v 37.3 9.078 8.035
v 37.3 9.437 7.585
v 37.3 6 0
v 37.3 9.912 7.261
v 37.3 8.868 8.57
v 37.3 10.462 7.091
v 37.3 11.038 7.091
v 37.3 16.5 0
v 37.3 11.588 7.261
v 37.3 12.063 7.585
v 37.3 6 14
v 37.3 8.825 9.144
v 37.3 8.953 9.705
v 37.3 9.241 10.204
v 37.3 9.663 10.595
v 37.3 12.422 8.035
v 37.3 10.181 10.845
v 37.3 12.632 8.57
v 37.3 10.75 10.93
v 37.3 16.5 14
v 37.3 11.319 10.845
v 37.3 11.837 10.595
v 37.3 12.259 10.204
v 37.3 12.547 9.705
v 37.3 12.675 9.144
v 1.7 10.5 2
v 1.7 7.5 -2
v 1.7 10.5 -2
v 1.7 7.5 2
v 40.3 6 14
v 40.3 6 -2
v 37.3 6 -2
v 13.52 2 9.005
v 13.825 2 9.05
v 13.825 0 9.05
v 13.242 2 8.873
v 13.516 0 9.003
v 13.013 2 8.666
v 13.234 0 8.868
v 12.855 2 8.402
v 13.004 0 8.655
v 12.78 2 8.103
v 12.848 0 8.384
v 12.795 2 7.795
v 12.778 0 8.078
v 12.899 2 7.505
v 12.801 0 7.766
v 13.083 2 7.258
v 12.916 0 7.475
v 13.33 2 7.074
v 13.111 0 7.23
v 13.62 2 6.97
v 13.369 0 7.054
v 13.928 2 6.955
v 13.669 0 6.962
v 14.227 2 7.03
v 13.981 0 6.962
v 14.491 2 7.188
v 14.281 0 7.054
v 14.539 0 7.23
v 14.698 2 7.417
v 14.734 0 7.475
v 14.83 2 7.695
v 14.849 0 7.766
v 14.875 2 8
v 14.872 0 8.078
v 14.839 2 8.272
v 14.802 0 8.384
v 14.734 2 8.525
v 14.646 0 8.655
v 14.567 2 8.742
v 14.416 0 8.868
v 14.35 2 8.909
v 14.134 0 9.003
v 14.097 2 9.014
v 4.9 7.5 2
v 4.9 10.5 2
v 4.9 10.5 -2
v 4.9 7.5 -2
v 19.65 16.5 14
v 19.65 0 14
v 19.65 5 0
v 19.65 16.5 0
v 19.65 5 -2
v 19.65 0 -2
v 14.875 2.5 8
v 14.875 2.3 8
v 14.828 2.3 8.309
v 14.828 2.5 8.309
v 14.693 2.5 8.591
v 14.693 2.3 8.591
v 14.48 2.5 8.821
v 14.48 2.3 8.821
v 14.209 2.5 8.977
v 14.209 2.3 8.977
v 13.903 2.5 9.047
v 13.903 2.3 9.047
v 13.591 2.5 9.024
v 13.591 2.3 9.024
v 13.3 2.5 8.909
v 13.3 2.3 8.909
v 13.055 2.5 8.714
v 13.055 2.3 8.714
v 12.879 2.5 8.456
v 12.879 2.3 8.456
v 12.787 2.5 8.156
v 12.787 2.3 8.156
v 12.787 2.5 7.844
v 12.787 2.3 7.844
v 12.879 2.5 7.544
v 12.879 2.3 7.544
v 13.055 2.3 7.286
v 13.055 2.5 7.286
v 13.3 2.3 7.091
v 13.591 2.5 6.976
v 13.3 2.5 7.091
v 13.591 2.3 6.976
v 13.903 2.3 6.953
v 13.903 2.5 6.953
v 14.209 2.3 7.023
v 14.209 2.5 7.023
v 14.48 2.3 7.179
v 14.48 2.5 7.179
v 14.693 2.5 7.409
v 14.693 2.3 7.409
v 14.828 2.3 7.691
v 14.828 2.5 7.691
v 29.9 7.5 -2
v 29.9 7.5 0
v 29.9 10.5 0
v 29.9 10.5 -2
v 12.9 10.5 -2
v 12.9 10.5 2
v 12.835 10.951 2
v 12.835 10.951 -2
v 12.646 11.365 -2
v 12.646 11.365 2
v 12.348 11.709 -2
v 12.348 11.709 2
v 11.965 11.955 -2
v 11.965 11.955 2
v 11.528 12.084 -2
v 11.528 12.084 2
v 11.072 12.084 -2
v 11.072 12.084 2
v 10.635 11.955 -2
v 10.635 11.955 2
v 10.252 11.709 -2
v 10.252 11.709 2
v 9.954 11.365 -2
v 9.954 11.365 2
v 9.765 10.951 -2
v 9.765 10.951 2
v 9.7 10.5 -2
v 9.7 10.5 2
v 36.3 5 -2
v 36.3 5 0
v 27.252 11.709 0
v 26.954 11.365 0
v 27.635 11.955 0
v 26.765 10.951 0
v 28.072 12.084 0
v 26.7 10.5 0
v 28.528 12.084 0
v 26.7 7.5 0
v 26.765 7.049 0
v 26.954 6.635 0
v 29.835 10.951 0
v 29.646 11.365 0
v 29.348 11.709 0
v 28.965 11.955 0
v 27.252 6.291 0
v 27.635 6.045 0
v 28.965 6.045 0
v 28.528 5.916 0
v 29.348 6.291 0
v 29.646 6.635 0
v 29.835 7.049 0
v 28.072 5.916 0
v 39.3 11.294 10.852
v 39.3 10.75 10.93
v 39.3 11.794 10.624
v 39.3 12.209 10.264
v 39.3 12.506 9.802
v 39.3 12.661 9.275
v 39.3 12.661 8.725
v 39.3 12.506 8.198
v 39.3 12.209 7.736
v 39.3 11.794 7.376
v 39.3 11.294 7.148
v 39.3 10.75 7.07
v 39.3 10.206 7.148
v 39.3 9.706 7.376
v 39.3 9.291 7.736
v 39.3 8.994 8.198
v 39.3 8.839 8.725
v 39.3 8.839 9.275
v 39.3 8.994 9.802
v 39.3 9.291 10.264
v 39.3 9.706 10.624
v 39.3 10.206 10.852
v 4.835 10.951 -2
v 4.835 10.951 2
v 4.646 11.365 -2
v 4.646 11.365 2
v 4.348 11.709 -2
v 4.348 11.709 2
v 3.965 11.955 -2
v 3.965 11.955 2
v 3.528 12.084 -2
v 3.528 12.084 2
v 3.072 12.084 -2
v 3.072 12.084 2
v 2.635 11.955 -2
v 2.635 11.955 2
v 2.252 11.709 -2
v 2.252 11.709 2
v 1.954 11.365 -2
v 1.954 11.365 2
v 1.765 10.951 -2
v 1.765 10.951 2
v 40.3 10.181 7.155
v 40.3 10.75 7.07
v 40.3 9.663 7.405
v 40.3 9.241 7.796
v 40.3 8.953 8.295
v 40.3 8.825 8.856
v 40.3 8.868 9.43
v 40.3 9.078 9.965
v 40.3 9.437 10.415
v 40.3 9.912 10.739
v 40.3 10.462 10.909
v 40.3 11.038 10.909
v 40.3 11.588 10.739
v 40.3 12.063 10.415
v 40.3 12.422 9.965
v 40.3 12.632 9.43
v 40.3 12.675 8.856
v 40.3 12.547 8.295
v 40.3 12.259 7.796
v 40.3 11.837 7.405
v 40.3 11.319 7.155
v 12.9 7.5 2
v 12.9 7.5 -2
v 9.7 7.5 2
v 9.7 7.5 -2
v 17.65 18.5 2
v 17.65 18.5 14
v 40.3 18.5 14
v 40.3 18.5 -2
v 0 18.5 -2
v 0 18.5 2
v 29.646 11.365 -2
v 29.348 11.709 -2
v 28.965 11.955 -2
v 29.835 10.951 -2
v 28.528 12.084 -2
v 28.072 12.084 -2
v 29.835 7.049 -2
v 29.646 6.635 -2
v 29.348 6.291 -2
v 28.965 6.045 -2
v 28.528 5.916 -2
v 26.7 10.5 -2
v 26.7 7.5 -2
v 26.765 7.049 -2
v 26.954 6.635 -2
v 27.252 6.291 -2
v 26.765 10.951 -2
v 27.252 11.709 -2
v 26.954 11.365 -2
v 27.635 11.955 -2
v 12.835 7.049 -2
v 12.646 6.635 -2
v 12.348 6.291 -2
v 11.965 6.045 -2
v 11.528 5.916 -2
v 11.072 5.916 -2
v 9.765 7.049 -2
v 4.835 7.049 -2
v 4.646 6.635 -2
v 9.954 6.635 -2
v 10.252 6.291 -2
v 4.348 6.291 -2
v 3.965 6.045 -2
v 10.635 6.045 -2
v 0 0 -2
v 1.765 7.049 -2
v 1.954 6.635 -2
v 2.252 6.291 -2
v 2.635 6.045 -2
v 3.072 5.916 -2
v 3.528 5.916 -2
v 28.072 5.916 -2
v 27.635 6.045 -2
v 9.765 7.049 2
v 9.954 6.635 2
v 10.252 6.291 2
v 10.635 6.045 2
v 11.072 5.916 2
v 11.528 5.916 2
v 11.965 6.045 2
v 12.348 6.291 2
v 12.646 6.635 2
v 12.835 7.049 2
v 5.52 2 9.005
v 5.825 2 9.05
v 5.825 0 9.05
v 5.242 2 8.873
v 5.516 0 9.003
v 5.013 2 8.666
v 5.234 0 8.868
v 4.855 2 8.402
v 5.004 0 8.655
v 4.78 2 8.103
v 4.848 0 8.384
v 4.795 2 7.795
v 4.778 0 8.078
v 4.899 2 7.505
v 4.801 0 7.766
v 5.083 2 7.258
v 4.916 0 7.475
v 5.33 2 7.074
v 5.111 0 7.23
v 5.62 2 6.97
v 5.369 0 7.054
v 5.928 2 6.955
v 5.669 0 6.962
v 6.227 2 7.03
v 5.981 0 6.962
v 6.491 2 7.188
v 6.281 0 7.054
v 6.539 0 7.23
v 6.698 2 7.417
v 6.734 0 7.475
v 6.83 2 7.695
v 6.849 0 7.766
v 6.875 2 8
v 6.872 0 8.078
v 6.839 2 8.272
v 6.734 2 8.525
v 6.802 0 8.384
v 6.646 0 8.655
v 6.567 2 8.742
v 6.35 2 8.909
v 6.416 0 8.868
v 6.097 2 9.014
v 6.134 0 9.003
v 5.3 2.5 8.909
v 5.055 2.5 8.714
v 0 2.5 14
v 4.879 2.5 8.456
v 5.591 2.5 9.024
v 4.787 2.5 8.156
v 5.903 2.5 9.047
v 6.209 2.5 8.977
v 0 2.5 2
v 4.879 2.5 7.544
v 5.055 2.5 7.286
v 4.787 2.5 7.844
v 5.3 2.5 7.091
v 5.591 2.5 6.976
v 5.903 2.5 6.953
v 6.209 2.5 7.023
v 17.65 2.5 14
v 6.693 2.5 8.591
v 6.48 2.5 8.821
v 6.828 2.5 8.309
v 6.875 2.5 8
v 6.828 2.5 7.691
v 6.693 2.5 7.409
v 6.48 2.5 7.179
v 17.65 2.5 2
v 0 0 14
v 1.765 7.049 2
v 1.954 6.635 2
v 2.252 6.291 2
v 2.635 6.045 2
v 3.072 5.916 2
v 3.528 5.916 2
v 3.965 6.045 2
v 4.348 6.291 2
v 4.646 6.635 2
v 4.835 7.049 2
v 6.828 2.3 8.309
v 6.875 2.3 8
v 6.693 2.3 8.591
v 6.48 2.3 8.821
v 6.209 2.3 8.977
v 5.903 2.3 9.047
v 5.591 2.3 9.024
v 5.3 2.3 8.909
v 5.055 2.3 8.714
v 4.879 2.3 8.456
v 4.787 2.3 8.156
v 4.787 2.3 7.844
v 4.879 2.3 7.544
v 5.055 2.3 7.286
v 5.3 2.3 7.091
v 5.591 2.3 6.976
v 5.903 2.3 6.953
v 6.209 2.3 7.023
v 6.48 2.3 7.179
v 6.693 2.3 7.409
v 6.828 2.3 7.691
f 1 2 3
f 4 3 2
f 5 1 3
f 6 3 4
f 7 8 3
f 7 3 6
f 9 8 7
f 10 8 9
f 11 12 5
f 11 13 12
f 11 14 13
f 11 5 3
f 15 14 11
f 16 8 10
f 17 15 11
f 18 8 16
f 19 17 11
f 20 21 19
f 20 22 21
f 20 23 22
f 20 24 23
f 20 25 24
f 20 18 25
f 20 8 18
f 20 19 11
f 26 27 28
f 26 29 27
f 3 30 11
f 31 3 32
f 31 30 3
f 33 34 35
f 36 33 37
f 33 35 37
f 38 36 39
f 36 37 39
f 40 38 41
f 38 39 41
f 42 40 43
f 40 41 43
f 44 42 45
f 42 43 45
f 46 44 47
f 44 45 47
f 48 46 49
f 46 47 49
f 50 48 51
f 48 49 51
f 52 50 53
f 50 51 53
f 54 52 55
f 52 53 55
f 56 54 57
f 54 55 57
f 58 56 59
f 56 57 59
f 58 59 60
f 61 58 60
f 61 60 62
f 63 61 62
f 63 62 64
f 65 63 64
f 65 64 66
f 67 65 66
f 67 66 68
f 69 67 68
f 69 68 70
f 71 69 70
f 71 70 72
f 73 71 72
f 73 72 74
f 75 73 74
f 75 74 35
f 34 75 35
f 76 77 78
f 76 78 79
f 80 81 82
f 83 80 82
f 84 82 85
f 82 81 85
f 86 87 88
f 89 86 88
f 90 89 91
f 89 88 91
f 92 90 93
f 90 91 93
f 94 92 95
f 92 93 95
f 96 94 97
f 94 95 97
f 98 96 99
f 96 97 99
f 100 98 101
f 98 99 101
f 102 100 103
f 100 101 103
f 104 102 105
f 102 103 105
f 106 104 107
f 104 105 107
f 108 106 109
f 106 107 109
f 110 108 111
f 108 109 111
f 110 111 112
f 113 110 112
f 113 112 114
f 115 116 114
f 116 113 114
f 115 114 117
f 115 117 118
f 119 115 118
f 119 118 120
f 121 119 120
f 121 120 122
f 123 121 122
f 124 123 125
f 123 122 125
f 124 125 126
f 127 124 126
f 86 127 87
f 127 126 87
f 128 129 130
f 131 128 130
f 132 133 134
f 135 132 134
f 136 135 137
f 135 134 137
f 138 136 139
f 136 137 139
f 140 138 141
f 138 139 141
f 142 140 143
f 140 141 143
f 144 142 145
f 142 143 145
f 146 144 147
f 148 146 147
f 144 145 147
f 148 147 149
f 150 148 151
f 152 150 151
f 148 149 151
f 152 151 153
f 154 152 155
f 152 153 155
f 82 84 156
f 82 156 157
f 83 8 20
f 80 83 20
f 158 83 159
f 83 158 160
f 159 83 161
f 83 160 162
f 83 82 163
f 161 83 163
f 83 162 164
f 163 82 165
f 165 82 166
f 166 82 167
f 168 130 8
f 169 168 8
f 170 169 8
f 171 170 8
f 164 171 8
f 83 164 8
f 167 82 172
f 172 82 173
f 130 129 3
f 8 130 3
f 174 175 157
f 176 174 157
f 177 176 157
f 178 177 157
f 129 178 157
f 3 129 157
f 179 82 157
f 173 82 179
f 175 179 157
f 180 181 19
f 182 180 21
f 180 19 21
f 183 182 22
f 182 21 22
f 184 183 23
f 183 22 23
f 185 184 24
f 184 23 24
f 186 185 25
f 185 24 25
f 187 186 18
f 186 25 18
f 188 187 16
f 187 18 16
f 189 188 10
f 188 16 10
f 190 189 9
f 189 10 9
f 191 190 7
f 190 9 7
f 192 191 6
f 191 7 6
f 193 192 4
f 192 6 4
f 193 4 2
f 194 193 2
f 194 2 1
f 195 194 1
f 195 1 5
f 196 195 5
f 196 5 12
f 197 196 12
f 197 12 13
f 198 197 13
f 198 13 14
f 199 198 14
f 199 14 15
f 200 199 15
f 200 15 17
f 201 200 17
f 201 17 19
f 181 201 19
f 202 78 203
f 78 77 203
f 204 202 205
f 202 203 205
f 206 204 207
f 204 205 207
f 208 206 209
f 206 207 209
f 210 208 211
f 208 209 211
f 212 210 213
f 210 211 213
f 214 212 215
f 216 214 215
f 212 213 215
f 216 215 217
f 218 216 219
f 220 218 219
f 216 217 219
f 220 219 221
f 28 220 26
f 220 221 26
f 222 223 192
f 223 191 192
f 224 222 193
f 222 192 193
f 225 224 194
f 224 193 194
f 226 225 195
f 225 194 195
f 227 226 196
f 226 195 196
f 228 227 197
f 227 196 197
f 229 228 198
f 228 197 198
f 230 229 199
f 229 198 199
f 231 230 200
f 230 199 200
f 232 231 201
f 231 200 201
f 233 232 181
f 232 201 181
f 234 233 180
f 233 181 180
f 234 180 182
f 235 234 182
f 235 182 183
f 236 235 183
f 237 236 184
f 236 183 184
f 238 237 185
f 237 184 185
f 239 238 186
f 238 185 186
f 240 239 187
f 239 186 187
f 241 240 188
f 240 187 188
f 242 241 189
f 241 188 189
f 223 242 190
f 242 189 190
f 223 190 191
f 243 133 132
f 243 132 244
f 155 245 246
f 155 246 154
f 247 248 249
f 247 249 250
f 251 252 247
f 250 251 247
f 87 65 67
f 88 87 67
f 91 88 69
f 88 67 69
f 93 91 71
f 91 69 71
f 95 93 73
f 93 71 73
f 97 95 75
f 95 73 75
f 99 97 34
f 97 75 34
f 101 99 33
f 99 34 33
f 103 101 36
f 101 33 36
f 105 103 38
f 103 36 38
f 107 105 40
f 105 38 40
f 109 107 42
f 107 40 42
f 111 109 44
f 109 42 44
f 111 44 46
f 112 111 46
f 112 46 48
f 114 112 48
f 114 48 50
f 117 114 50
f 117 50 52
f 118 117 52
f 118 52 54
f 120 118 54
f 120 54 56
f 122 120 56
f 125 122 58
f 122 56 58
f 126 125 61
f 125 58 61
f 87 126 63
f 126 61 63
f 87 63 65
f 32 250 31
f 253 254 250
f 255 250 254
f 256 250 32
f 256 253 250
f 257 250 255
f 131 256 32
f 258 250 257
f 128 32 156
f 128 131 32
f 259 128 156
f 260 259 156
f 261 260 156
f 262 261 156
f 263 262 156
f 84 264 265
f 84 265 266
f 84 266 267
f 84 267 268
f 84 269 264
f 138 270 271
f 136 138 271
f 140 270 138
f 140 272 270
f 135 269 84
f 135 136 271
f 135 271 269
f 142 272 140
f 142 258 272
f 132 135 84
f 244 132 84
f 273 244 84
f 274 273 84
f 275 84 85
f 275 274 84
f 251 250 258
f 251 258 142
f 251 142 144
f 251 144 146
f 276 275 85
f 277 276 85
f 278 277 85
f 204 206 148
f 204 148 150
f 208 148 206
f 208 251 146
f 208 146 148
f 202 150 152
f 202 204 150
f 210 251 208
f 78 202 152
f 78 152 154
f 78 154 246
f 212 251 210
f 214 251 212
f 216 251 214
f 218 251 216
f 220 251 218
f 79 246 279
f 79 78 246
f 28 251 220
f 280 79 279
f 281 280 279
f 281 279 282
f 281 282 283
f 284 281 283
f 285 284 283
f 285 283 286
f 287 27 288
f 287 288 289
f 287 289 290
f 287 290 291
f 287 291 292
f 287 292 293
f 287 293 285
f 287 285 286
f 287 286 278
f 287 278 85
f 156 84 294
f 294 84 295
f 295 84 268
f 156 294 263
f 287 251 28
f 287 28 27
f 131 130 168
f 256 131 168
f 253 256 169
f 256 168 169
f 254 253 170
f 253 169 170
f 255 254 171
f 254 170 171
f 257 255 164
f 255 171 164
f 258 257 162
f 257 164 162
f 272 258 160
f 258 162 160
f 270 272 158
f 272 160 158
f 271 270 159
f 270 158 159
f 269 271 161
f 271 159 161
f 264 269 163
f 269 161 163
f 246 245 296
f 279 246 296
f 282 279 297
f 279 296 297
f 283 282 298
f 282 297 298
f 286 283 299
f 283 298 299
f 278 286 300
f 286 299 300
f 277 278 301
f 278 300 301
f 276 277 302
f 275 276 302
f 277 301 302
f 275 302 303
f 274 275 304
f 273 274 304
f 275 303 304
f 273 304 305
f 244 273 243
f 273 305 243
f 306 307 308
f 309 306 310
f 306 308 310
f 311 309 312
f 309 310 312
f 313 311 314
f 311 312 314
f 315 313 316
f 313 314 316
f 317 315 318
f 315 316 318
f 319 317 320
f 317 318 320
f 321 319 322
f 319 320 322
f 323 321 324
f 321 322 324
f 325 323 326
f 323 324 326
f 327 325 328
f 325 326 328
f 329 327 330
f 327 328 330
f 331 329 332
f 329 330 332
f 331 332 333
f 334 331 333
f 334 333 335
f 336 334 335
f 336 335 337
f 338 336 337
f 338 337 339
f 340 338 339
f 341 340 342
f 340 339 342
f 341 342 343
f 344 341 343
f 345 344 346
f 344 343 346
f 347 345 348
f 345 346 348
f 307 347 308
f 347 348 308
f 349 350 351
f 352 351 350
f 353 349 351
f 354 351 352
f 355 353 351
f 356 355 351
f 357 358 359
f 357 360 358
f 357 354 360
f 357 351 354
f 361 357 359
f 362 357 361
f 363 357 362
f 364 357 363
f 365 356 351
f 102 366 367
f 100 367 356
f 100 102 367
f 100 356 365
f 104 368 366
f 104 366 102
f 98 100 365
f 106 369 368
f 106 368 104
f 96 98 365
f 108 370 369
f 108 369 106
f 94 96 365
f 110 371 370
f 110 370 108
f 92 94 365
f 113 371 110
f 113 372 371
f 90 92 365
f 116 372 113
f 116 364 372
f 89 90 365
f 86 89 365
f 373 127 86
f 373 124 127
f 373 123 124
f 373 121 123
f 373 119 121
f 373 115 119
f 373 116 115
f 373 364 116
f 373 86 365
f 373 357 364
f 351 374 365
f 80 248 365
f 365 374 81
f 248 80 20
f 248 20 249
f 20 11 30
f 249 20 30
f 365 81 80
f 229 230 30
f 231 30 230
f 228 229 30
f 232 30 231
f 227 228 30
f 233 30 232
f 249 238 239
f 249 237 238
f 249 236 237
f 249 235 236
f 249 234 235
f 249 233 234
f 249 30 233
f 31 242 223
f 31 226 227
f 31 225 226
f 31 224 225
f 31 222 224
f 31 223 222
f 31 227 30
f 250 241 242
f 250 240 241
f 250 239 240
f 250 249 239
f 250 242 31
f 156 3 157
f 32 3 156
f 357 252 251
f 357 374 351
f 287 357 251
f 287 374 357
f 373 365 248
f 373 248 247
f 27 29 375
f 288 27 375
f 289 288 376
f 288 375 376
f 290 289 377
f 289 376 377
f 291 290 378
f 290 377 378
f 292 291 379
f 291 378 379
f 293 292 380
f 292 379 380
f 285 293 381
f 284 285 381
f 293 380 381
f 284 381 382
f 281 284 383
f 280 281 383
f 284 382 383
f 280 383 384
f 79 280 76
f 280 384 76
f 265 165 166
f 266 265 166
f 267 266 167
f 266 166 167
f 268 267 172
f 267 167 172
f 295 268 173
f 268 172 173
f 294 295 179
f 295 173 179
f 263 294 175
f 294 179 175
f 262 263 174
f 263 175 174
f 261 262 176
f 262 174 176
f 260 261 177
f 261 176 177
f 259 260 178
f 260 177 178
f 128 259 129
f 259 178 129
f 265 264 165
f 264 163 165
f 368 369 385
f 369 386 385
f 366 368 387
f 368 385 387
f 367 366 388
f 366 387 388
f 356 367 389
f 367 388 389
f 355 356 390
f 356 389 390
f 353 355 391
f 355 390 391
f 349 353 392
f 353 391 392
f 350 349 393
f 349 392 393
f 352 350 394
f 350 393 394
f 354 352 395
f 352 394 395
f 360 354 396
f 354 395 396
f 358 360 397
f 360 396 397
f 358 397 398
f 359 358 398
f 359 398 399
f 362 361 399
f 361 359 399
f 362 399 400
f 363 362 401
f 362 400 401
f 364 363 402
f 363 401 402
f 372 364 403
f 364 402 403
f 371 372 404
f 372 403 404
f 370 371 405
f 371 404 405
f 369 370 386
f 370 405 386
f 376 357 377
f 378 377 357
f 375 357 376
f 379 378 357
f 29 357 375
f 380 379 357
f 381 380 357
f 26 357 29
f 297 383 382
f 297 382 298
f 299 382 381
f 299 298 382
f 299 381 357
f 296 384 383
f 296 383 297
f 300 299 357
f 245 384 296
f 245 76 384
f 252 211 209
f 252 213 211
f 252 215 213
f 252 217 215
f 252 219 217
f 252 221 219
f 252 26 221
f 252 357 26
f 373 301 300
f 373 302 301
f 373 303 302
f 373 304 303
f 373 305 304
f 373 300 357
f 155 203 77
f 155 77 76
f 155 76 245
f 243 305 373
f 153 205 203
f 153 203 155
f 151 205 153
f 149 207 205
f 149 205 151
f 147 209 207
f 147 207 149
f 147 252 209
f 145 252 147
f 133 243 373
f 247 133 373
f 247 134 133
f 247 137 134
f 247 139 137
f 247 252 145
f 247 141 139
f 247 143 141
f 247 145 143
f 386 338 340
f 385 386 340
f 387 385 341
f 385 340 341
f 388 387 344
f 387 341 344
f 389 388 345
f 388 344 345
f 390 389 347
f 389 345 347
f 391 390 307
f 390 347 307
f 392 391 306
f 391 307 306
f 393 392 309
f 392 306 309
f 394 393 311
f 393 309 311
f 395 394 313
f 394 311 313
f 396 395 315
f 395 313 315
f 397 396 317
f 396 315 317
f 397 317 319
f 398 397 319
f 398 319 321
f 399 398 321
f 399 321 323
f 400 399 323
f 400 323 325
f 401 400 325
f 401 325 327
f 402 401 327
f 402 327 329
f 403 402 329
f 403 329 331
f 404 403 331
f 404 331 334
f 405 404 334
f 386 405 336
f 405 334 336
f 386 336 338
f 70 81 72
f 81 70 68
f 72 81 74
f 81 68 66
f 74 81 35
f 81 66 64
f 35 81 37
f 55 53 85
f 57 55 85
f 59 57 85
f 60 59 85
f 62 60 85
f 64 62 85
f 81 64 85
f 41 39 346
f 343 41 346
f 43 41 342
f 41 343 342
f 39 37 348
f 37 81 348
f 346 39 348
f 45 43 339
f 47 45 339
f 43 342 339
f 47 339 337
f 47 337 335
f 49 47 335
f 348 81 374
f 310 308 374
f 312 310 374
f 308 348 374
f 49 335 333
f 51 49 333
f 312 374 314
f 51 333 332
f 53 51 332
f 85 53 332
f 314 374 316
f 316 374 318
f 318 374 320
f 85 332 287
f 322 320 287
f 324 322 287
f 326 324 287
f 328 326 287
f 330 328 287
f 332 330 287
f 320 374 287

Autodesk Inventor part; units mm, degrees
ref_plane "YZ Plane" through (0, 0, 0) normal (1, 0, 0) x (0, 1, 0)
ref_plane "XZ Plane" through (0, 0, 0) normal (0, 1, 0) x (-1, 0, 0)
ref_plane "XY Plane" through (0, 0, 0) normal (0, 0, 1) x (1, 0, 0)
sketch "Sketch1" plane through (0, 0, 0) normal (0, 0, 1) x (1, 0, 0)
  line L0 (0, 0) -> (49.1, 0)
  line L1 (49.1, 0) -> (49.1, 12.5)
  line L2 (49.1, 12.5) -> (0, 12.5)
  line L3 (0, 12.5) -> (0, 0)
  line L4 (0, 0) -> (49.1, 0)
  line L5 (49.1, 0) -> (49.1, 12.5)
  dimension "d0" = 49.1
  dimension "d1" = 12.5
extrude "Extrusion1" add sketch "Sketch1" along normal blind 14
sketch "Sketch2" plane through (0, 0, 0) normal (-1, 0, 0) x (0, 0, 1)
  line L0 (0, 0) -> (2, 0)
  line L1 (2, 0) -> (2, 5)
  line L2 (2, 5) -> (0, 5)
  line L3 (0, 5) -> (0, 0)
  dimension "d4" = 2
  dimension "d5" = 5
sketch "Sketch3" plane through (0, 0, 14) normal (0, 0, 1) x (1, 0, 0)
  line L0 (0, 12.5) -> (0, 0) projected
  line L1 (49.1, 0) -> (49.1, 12.5) projected
  line L2 (0, 0) -> (49.1, 0)
  line L3 (49.1, 0) -> (47.6, 0)
  line L4 (0, 0) -> (49.1, 0) projected
  line L5 (47.6, 0) -> (47.6, 11.5)
  line L6 (49.1, 12.5) -> (0, 12.5) projected
  line L7 (47.6, 11.5) -> (19.65, 11.5)
  line L8 (19.65, 11.5) -> (19.65, 0)
  dimension "d8" = 1.5
  dimension "d9" = 11.5
  dimension "d10" = 27.95
extrude "Extrusion3" cut sketch "Sketch3" against normal blind 13 contours L8 L7 L5 L2
sketch "Sketch4" plane through (0, 0, 14) normal (-1, 0, 0) x (0, 0, 1)
  line L0 (0, 12.5) -> (0, 0) projected
  line L1 (0, 0) -> (0, 2)
  line L2 (0, 2) -> (0, 12.5)
  line L3 (0, 2) -> (-10, 2)
  line L4 (-12, 5) -> (-12, 0) projected
  line L5 (-10, 2) -> (-10, 12.5)
  line L6 (-14, 12.5) -> (0, 12.5) projected
  line L7 (-10, 12.5) -> (0, 12.5)
  point P0 (-14, 0)
  dimension "d13" = 2
  dimension "d14" = 10
extrude "Extrusion4" cut sketch "Sketch4" against normal blind 17.65
sketch "Sketch5" plane through (0, 2, 14) normal (0, 1, 0) x (1, 0, 0)
  line L0 (17.65, 0) -> (0, 0) projected
  line L1 (0, 0) -> (5.825, 0)
  line L2 (5.825, 0) -> (5.825, 6)
  line L3 (5.825, 6) -> (13.825, 6)
  circle A0 centre (5.825, 6) radius 1.05
  circle A1 centre (13.825, 6) radius 1.05
  point P0 (0, 14)
  dimension "d18" = 5.825
  dimension "d19" = 6
  dimension "d20" = 8
  dimension "d21" = 2.1
  dimension "d22" = 2.1
hole "Hole1" at (5.825, 2, 8) at (13.825, 2, 8) direction (0, -1, 0) diameter 2.1 depth 20 tip angle 118
sketch "Sketch6" plane through (0, 0, 0) normal (0, 0, -1) x (-1, 0, 0)
  line L0 (0, 12.5) -> (0, 8.5)
  line L1 (0, 8.5) -> (-3.3, 8.5)
  line L2 (-4.9, 8.5) -> (-11.3, 8.5)
  line L3 (-12.9, 8.5) -> (-28.3, 8.5)
  line L4 (-28.3, 9.8) -> (-28.3, 10.5)
  line L5 (-28.3, 9.2) -> (-28.3, 7.5)
  line L6 (-11.3, 8.5) -> (-11.3, 10.5)
  line L7 (-11.3, 10.5) -> (-11.3, 7.5)
  line L8 (-3.3, 8.5) -> (-3.3, 9.1)
  line L9 (-3.3, 10.5) -> (-3.3, 7.5)
  arc A0 (-29.9, 7.5) -> (-26.7, 7.5) centre (-28.3, 7.5) ccw
  arc A1 (-4.9, 7.5) -> (-1.7, 7.5) centre (-3.3, 7.5) ccw
  arc A2 (-1.7, 10.5) -> (-4.9, 10.5) centre (-3.3, 10.5) ccw
  line L10 (-26.7, 10.5) -> (-26.7, 7.5)
  line L11 (-29.9, 7.5) -> (-29.9, 10.5)
  line L12 (-12.9, 10.5) -> (-12.9, 7.5)
  line L13 (-9.7, 7.5) -> (-9.7, 10.5)
  line L14 (-4.9, 10.5) -> (-4.9, 7.5)
  line L15 (-1.7, 7.5) -> (-1.7, 10.5)
  arc A3 (-12.9, 7.5) -> (-9.7, 7.5) centre (-11.3, 7.5) ccw
  arc A4 (-9.7, 10.5) -> (-12.9, 10.5) centre (-11.3, 10.5) ccw
  arc A5 (-26.7, 10.5) -> (-29.9, 10.5) centre (-28.3, 10.5) ccw
  arc A6 (-29.1307, 9.5) -> (-28.3, 9.2) centre (-28.3, 10.5) ccw
  point P0 (0, 0)
  dimension "d30" = 4
  dimension "d31" = 3.3
  dimension "d32" = 8
  dimension "d33" = 17
  dimension "d47" = 2
  dimension "d48" = 1
  dimension "d49" = 2
  dimension "d50" = 3
  dimension "d51" = 2
  dimension "d52" = 3
  dimension "d53" = 3.2
  dimension "d55" = 3.2
  dimension "d56" = 3.2
  dimension "d134" = 1.6
sketch "Sketch7" plane through (0, 0, 14) normal (0, 0, 1) x (1, 0, 0)
  line L0 (0, 12.5) -> (0, 0) projected
  line L1 (19.65, 0) -> (19.65, 11.5) projected
  line L2 (0, 0) -> (19.65, 0)
  line L3 (19.65, 0) -> (19.65, 2)
  line L4 (19.65, 2) -> (0, 2)
  line L5 (0, 2) -> (0, 0)
  line L6 (17.65, 12.5) -> (15.65, 12.5) projected
  line L7 (19.65, 2) -> (17.65, 2)
  line L8 (17.65, 2) -> (17.65, 12.5)
  line L9 (17.65, 12.5) -> (19.65, 12.5)
  line L10 (19.65, 12.5) -> (19.65, 2)
  line L11 (49.1, 0) -> (49.1, 12.5) projected
  line L12 (17.65, 12.5) -> (49.1, 12.5)
  line L13 (49.1, 12.5) -> (49.1, 11.5)
  line L14 (47.6, 11.5) -> (19.65, 11.5)
  line L15 (17.65, 11.5) -> (17.65, 12.5)
  line L16 (47.6, 11.5) -> (47.6, 0) projected
  line L17 (47.6, 11.5) -> (47.6, 0)
  line L18 (47.6, 0) -> (49.1, 0)
  line L19 (49.1, 0) -> (49.1, 11.5)
  dimension "d41" = 2
extrude "Extrusion5" add sketch "Sketch7" along normal blind 2
sketch "Sketch9" plane through (0, 0, 0) normal (-1, 0, 0) x (0, 0, 1)
  line L0 (0, 0) -> (16, 0) projected
  line L1 (1, 0) -> (1, 11.5) projected
  line L2 (0, 0) -> (1, 0)
  line L3 (1, 0) -> (1, 4)
  line L4 (1, 4) -> (0, 4)
  line L5 (0, 4) -> (0, 0)
  dimension "d44" = 4
extrude "Extrusion6" cut sketch "Sketch9" against normal blind 100
sketch "Sketch11" plane through (0, 2, 4) normal (-1, 0, 0) x (0, 0, 1)
  line L0 (0, 0) -> (0, 10.5) projected
  line L1 (0, 0) -> (0, 2)
  line L2 (-4, 10.5) -> (-4, 2) projected
  line L3 (0, 2) -> (-4, 2)
  line L4 (-4, 2) -> (-6, 2)
  line L5 (-6, 2) -> (-6, 10.5)
  line L6 (-4, 10.5) -> (0, 10.5) projected
  line L7 (-6, 10.5) -> (-4, 10.5)
  line L8 (-4, 10.5) -> (-4, 2)
  point P0 (-4, -2)
  dimension "d61" = 2
  dimension "d62" = 4
  dimension "d63" = 2
extrude "Extrusion8" add sketch "Sketch11" against normal blind 49.1 contours L4 L5 L7 L2
extrude "Extrusion7" cut sketch "Sketch6" along normal blind 100 and the other way blind 50
sketch "Sketch12" plane through (0, 2, 4) normal (-1, 0, 0) x (0, 0, 1)
  line L0 (0, 0) -> (0, 10.5) projected
  line L1 (0, 0) -> (-3, 0)
  line L2 (-3, -2) -> (-3, 2) projected
  line L3 (-3, -2) -> (12, -2) projected
  line L4 (-3, -2) -> (-6, -2)
  line L5 (-3, 2) -> (-6, 2) projected
  line L6 (-6, -2) -> (-6, 2)
  line L7 (-6, 2) -> (-3, 2)
  line L8 (-3, 2) -> (-3, -2)
  point P0 (-4, -2)
  dimension "d68" = 3
  dimension "d69" = 4
  dimension "d70" = 90
extrude "Extrusion9" add sketch "Sketch12" against normal blind 49.1
sketch "Sketch13" plane through (47.6, 0, 1) normal (-1, 0, 0) x (0, 0, 1)
  line L0 (15, 0) -> (0, 0) projected
  line L1 (0, 11.5) -> (0, 0) projected
  line L2 (0, 0) -> (0, 11.5)
  line L3 (15, 11.5) -> (0, 11.5) projected
  line L4 (0, 11.5) -> (15, 11.5)
  line L5 (15, 11.5) -> (15, 0)
  line L6 (15, 0) -> (0, 0)
  point P0 (-1, 0)
extrude "Extrusion10" add sketch "Sketch13" along normal blind 1
sketch "Sketch14" plane through (49.1, 0, 16) normal (1, 0, 0) x (0, 0, -1)
  line L0 (15, 0) -> (0, 0) projected
  line L1 (18, 12.5) -> (0, 12.5) projected
  line L2 (0, 0) -> (18, 0)
  line L3 (18, 0) -> (18, 12.5)
  line L4 (18, 12.5) -> (0, 12.5)
  line L5 (0, 12.5) -> (0, 0)
  point P0 (16, 0)
extrude "Extrusion11" cut sketch "Sketch14" against normal blind 12.3
sketch "Sketch15" plane through (36.8, 0, 16) normal (1, 0, 0) x (0, 0, -1)
  line L0 (18, 12.5) -> (18, 0) projected
  line L1 (15, 0) -> (0, 0) projected
  line L2 (18, 12.5) -> (0, 12.5)
  line L3 (0, 12.5) -> (0, 0)
  line L4 (0, 0) -> (18, 0)
  line L5 (18, 0) -> (18, 12.5)
  point P0 (16, 0)
  point P1 (18, 0)
extrude "Extrusion12" add sketch "Sketch15" along normal blind 2.5
sketch "Sketch17" plane through (0, 0, -2) normal (0, -1, 0) x (1, 0, 0)
  line L0 (39.3, 0) -> (39.3, 18) projected
  line L1 (39.3, 0) -> (39.3, 16)
  line L2 (39.3, 16) -> (36.8, 16)
  line L3 (36.8, 3) -> (36.8, 18) projected
  line L4 (36.8, 16) -> (36.8, 3)
  line L5 (19.65, 3) -> (36.8, 3) projected
  line L6 (36.8, 3) -> (19.65, 3)
  line L7 (19.65, 3) -> (19.65, 0)
  line L8 (0, 0) -> (39.3, 0) projected
  line L9 (19.65, 0) -> (39.3, 0)
  point P0 (0, 2)
extrude "Extrusion14" cut sketch "Sketch17" against normal blind 5
sketch "Sketch18" plane through (36.8, 0, 16) normal (0, -1, 0) x (1, 0, 0)
  line L0 (2.5, 0) -> (-19.15, 0) projected
  line L1 (2.5, 0) -> (0, 0)
  line L2 (0, 0) -> (0, -2)
  line L3 (0, -2) -> (2.5, -2)
  line L4 (2.5, -2) -> (2.5, 0)
  point P0 (-36.8, -16)
  dimension "d84" = 2.5
  dimension "d85" = 2
extrude "Extrusion15" cut sketch "Sketch18" against normal blind 5
sketch "Sketch19" plane through (19.65, 11.5, 1) normal (0, -1, 0) x (1, 0, 0)
  line L0 (0, 15) -> (0, 0) projected
  line L1 (0, 0) -> (0, 15)
  line L2 (0, 15) -> (17.15, 15)
  line L3 (19.65, 15) -> (-2, 15) projected
  line L4 (17.15, 15) -> (17.15, 0)
  line L5 (17.15, 0) -> (0, 0)
  point P0 (-19.65, -1)
  point P1 (0, 0)
  dimension "d88" = 17.15
  dimension "d89" = 15
extrude "Extrusion16" cut sketch "Sketch19" against normal blind 5
sketch "Sketch20" plane through (0, 12.5, 4) normal (0, 1, 0) x (1, 0, 0)
  line L0 (0, 6) -> (0, -12) projected
  line L1 (0, 6) -> (0, 0)
  line L2 (0, 6) -> (39.3, 6) projected
  line L3 (0, 6) -> (39.3, 6)
  line L4 (39.3, -12) -> (39.3, 6) projected
  line L5 (39.3, 6) -> (39.3, -12)
  line L6 (39.3, -12) -> (36.8, -12) projected
  line L7 (39.3, -12) -> (36.8, -12)
  line L8 (36.8, -12) -> (36.8, 3)
  line L9 (36.8, 3) -> (19.65, 3)
  line L10 (19.65, -12) -> (19.65, 3) projected
  line L11 (19.65, 3) -> (19.65, -12)
  line L12 (17.65, -12) -> (17.65, 0) projected
  line L13 (19.65, -12) -> (17.65, -12)
  line L14 (17.65, -12) -> (17.65, 0)
  line L15 (17.65, 0) -> (17.65, 6)
  point P0 (0, 4)
  dimension "d92" = 6
extrude "Extrusion17" add sketch "Sketch20" along normal blind 4
sketch "Sketch21" plane through (0, 12.5, 4) normal (0, 1, 0) x (1, 0, 0)
  line L0 (0, -12) -> (0, 0) projected
  line L1 (0, 0) -> (17.65, 0)
  line L2 (17.65, 0) -> (17.65, 6)
  line L3 (17.65, 6) -> (0, 6)
  line L4 (0, 6) -> (0, 0)
  point P0 (0, 4)
extrude "Extrusion18" add sketch "Sketch21" along normal blind 4
sketch "Sketch22" plane through (0, 16.5, 4) normal (0, 1, 0) x (1, 0, 0)
  line L0 (0, 6) -> (0, 0) projected
  line L1 (0, 0) -> (36.92, 0)
  line L2 (19.65, 3) -> (36.8, 3) projected
  line L3 (36.8, 3) -> (36.8, 0)
  line L4 (36.8, 3) -> (36.8, -12) projected
  line L5 (36.8, 0) -> (36.3, 0)
  line L6 (36.3, 0) -> (36.3, 3)
  point P0 (0, 4)
  dimension "d97" = 3
  dimension "d98" = 0.5
extrude "Extrusion19" add sketch "Sketch22" against normal blind 11.5
sketch "Sketch23" plane through (36.8, 0, 16) normal (-1, 0, 0) x (0, 0, 1)
  line L0 (0, 0) -> (0, 5)
  line L1 (-12, 5) -> (0, 5) projected
  line L2 (0, 5) -> (-12, 5)
  line L3 (-12, 16.5) -> (-12, 5) projected
  line L4 (-12, 5) -> (-12, 16.5)
  line L5 (-12, 16.5) -> (0, 16.5)
  line L6 (0, 16.5) -> (0, 5)
  line L7 (0, 5) -> (0, 16.5) projected
  line L8 (0, 10.75) -> (-7, 10.75)
  circle A0 centre (-7, 10.75) radius 1.9304
  point P0 (-16, 0)
  dimension "d101" = 5
  dimension "d102" = 12
  dimension "d103" = 7
  dimension "d104" = 3.8608
sketch "Sketch24" plane through (0, 16.5, 4) normal (0, 1, 0) x (1, 0, 0)
  line L0 (39.3, -12) -> (39.3, 6) projected
  line L1 (39.3, -12) -> (36.3, -12)
  line L2 (36.8, -12) -> (39.3, -12) projected
  line L3 (36.3, -12) -> (36.3, 0)
  line L4 (36.3, 0) -> (36.8, 0) projected
  line L5 (36.8, 0) -> (36.8, -12) projected
  line L6 (36.8, 0) -> (36.8, -12)
  point P0 (0, 4)
  dimension "d107" = 3
extrude "Extrusion21" add sketch "Sketch24" against normal blind 11.5
extrude "Extrusion22" cut sketch "Sketch23" along normal mid plane 11.5 contours A0
sketch "Sketch25" plane through (0, 16.5, 4) normal (0, 1, 0) x (1, 0, 0)
  line L0 (17.65, -12) -> (0, -12) projected
  line L1 (39.3, 6) -> (0, 6) projected
  line L2 (0, -12) -> (39.3, -12)
  line L3 (39.3, -12) -> (39.3, 6)
  line L4 (39.3, 6) -> (0, 6)
  line L5 (0, 6) -> (0, -12)
  line L6 (0, 0) -> (17.65, 0) projected
  line L7 (17.65, 0) -> (0, 0)
  line L8 (0, 0) -> (0, -12)
  line L9 (0, -12) -> (17.65, -12)
  line L10 (17.65, -12) -> (17.65, 0)
  point P0 (0, 4)
extrude "Extrusion23" add sketch "Sketch25" along normal blind 2 contours L10 L6 L5 L1 L3 L2
sketch "Sketch26" plane through (0, 0, 16) normal (0, 0, 1) x (1, 0, 0)
  line L0 (0, 18.5) -> (0, 0) projected
  line L1 (19.65, 0) -> (19.65, 16.5) projected
  line L2 (0, 0) -> (19.65, 0)
  line L3 (19.65, 5) -> (19.65, 16.5) projected
  line L4 (19.65, 0) -> (19.65, 16.5)
  line L5 (19.65, 16.5) -> (36.3, 16.5) projected
  line L6 (19.65, 16.5) -> (36.3, 16.5)
  line L7 (36.3, 16.5) -> (36.3, 5) projected
  line L8 (36.3, 16.5) -> (36.3, 5)
  line L9 (39.3, 5) -> (19.65, 5) projected
  line L10 (36.3, 5) -> (39.3, 5)
  line L11 (39.3, 18.5) -> (0, 18.5) projected
  line L12 (39.3, 5) -> (39.3, 18.5)
  line L13 (39.3, 18.5) -> (17.65, 18.5)
  line L14 (0, 2) -> (17.65, 2) projected
  line L15 (0, 0) -> (0, 2)
  line L16 (0, 2) -> (17.65, 2)
  line L17 (0, 2) -> (17.65, 2)
  line L18 (17.65, 2) -> (17.65, 18.5)
  line L19 (17.65, 18.5) -> (0, 18.5)
  line L20 (0, 18.5) -> (0, 2)
  dimension "d114" = 3
  dimension "d115" = 21.65
extrude "Extrusion24" cut sketch "Sketch26" against normal blind 2 contours L14 L18 L11 L12 L9 L7 L5 L1 L2 L0
sketch "Sketch27" plane through (39.3, 0, 16) normal (1, 0, 0) x (0, 0, -1)
  line L0 (18, 18.5) -> (18, 0) projected
  line L1 (18, 0) -> (18, 5)
  line L2 (2, 5) -> (15, 5) projected
  line L3 (18, 5) -> (2, 5)
  line L4 (2, 18.5) -> (18, 18.5) projected
  line L5 (2, 5) -> (2, 18.5)
  line L6 (2, 18.5) -> (18, 18.5)
  line L7 (18, 18.5) -> (18, 5)
  circle A0 centre (7, 10.75) radius 1.9304 projected
  circle A1 centre (7, 10.75) radius 1.5
  point P0 (16, 0)
  dimension "d118" = 5
  dimension "d119" = 16
extrude "Extrusion25" add sketch "Sketch27" along normal blind 1 contours L0 L3 L2 L5 L4
sketch "Sketch28" plane through (36.3, 5, 1) normal (-1, 0, 0) x (0, 0, 1)
  line L0 (0, 0) -> (0, 11.5) projected
  line L1 (0, 0) -> (0, 11.5)
  line L2 (0, 11.5) -> (13, 11.5) projected
  line L3 (0, 11.5) -> (13, 11.5)
  line L4 (13, 11.5) -> (13, 0)
  line L5 (13, 0) -> (0, 0) projected
  line L6 (13, 0) -> (0, 0)
  circle A0 centre (8, 5.75) radius 1.9304 projected
  circle A1 centre (8, 5.75) radius 1.5
  point P0 (-1, -5)
  dimension "d122" = 11.5
extrude "Extrusion26" cut sketch "Sketch28" against normal blind 1 contours L0 L2 L4 L5
sketch "Sketch29" plane through (0, 5, -2) normal (0, -1, 0) x (1, 0, 0)
  line L0 (19.65, 0) -> (19.65, 3) projected
  line L1 (19.65, 0) -> (19.65, 3)
  line L2 (19.65, 3) -> (19.65, 2)
  line L3 (19.65, 2) -> (37.4623, 2)
  line L4 (19.65, 3) -> (37.3, 3) projected
  line L5 (37.3, 3) -> (37.3, 1.7723)
  line L6 (37.3, 3) -> (19.65, 3)
  point P0 (0, 2)
  point P1 (37.3, 2)
  dimension "d125" = 1
extrude "Extrusion27" cut sketch "Sketch29" against normal blind 11.5
sketch "Sketch30" plane through (0, 2, 4) normal (0, 1, 0) x (1, 0, 0)
  line L0 (0, 0) -> (17.65, 0) projected
  line L1 (17.65, -10) -> (17.65, 0) projected
  line L2 (0, 0) -> (17.65, 0)
  line L3 (17.65, 0) -> (17.65, -10)
  line L4 (17.65, -10) -> (0, -10)
  line L5 (0, -10) -> (0, 0)
  circle A0 centre (5.825, -4) radius 1.05 projected
  circle A1 centre (5.825, -4) radius 1.05
  circle A2 centre (13.825, -4) radius 1.05 projected
  circle A3 centre (13.825, -4) radius 1.05
  point P0 (0, 4)
extrude "Extrusion29" add sketch "Sketch30" along normal blind 0.3
sketch "Sketch31" plane through (0, 18.5, 4) normal (0, 0, 1) x (1, 0, 0)
  line L0 (0, 0) -> (0, -18.5) projected
  line L1 (17.65, 0) -> (17.65, -16.2) projected
  line L2 (0, 0) -> (17.65, 0)
  line L3 (17.65, 0) -> (17.65, -16.2)
  line L4 (17.65, -16.2) -> (0, -16.2)
  line L5 (0, -16.2) -> (0, 0)
extrude "Extrusion30" cut sketch "Sketch31" against normal blind 2
sketch "Sketch32" plane through (0, 2.3, 4) normal (0, 1, 0) x (1, 0, 0)
  line L0 (0, 2) -> (17.65, 2) projected
  line L1 (0, -10) -> (17.65, -10) projected
  line L2 (0, 2) -> (17.65, 2)
  line L3 (17.65, 2) -> (17.65, -10)
  line L4 (17.65, -10) -> (0, -10)
  line L5 (0, -10) -> (0, 2)
  circle A0 centre (5.825, -4) radius 1.05 projected
  circle A1 centre (5.825, -4) radius 1.05
  circle A2 centre (13.825, -4) radius 1.05 projected
  circle A3 centre (13.825, -4) radius 1.05
  point P0 (0, 4)
  point P1 (17.65, 2)
extrude "Extrusion31" add sketch "Sketch32" along normal blind 0.2
sketch "Sketch33" plane through (40.3, 0, 16) normal (1, 0, 0) x (0, 0, -1)
  line L0 (2, 5) -> (18, 5) projected
  line L1 (2, 18.5) -> (2, 5) projected
  line L2 (18, 5) -> (2, 5)
  line L3 (2, 5) -> (2, 6)
  line L4 (2, 6) -> (18, 6)
  line L5 (18, 6) -> (18, 5)
  point P0 (16, 0)
  dimension "d137" = 1
extrude "Extrusion32" cut sketch "Sketch33" against normal blind 3
chamfer "Chamfer1" distance 1 angle 45 1 edges at (37.3, 5, -1)
properties part number "Compliant_plate"
